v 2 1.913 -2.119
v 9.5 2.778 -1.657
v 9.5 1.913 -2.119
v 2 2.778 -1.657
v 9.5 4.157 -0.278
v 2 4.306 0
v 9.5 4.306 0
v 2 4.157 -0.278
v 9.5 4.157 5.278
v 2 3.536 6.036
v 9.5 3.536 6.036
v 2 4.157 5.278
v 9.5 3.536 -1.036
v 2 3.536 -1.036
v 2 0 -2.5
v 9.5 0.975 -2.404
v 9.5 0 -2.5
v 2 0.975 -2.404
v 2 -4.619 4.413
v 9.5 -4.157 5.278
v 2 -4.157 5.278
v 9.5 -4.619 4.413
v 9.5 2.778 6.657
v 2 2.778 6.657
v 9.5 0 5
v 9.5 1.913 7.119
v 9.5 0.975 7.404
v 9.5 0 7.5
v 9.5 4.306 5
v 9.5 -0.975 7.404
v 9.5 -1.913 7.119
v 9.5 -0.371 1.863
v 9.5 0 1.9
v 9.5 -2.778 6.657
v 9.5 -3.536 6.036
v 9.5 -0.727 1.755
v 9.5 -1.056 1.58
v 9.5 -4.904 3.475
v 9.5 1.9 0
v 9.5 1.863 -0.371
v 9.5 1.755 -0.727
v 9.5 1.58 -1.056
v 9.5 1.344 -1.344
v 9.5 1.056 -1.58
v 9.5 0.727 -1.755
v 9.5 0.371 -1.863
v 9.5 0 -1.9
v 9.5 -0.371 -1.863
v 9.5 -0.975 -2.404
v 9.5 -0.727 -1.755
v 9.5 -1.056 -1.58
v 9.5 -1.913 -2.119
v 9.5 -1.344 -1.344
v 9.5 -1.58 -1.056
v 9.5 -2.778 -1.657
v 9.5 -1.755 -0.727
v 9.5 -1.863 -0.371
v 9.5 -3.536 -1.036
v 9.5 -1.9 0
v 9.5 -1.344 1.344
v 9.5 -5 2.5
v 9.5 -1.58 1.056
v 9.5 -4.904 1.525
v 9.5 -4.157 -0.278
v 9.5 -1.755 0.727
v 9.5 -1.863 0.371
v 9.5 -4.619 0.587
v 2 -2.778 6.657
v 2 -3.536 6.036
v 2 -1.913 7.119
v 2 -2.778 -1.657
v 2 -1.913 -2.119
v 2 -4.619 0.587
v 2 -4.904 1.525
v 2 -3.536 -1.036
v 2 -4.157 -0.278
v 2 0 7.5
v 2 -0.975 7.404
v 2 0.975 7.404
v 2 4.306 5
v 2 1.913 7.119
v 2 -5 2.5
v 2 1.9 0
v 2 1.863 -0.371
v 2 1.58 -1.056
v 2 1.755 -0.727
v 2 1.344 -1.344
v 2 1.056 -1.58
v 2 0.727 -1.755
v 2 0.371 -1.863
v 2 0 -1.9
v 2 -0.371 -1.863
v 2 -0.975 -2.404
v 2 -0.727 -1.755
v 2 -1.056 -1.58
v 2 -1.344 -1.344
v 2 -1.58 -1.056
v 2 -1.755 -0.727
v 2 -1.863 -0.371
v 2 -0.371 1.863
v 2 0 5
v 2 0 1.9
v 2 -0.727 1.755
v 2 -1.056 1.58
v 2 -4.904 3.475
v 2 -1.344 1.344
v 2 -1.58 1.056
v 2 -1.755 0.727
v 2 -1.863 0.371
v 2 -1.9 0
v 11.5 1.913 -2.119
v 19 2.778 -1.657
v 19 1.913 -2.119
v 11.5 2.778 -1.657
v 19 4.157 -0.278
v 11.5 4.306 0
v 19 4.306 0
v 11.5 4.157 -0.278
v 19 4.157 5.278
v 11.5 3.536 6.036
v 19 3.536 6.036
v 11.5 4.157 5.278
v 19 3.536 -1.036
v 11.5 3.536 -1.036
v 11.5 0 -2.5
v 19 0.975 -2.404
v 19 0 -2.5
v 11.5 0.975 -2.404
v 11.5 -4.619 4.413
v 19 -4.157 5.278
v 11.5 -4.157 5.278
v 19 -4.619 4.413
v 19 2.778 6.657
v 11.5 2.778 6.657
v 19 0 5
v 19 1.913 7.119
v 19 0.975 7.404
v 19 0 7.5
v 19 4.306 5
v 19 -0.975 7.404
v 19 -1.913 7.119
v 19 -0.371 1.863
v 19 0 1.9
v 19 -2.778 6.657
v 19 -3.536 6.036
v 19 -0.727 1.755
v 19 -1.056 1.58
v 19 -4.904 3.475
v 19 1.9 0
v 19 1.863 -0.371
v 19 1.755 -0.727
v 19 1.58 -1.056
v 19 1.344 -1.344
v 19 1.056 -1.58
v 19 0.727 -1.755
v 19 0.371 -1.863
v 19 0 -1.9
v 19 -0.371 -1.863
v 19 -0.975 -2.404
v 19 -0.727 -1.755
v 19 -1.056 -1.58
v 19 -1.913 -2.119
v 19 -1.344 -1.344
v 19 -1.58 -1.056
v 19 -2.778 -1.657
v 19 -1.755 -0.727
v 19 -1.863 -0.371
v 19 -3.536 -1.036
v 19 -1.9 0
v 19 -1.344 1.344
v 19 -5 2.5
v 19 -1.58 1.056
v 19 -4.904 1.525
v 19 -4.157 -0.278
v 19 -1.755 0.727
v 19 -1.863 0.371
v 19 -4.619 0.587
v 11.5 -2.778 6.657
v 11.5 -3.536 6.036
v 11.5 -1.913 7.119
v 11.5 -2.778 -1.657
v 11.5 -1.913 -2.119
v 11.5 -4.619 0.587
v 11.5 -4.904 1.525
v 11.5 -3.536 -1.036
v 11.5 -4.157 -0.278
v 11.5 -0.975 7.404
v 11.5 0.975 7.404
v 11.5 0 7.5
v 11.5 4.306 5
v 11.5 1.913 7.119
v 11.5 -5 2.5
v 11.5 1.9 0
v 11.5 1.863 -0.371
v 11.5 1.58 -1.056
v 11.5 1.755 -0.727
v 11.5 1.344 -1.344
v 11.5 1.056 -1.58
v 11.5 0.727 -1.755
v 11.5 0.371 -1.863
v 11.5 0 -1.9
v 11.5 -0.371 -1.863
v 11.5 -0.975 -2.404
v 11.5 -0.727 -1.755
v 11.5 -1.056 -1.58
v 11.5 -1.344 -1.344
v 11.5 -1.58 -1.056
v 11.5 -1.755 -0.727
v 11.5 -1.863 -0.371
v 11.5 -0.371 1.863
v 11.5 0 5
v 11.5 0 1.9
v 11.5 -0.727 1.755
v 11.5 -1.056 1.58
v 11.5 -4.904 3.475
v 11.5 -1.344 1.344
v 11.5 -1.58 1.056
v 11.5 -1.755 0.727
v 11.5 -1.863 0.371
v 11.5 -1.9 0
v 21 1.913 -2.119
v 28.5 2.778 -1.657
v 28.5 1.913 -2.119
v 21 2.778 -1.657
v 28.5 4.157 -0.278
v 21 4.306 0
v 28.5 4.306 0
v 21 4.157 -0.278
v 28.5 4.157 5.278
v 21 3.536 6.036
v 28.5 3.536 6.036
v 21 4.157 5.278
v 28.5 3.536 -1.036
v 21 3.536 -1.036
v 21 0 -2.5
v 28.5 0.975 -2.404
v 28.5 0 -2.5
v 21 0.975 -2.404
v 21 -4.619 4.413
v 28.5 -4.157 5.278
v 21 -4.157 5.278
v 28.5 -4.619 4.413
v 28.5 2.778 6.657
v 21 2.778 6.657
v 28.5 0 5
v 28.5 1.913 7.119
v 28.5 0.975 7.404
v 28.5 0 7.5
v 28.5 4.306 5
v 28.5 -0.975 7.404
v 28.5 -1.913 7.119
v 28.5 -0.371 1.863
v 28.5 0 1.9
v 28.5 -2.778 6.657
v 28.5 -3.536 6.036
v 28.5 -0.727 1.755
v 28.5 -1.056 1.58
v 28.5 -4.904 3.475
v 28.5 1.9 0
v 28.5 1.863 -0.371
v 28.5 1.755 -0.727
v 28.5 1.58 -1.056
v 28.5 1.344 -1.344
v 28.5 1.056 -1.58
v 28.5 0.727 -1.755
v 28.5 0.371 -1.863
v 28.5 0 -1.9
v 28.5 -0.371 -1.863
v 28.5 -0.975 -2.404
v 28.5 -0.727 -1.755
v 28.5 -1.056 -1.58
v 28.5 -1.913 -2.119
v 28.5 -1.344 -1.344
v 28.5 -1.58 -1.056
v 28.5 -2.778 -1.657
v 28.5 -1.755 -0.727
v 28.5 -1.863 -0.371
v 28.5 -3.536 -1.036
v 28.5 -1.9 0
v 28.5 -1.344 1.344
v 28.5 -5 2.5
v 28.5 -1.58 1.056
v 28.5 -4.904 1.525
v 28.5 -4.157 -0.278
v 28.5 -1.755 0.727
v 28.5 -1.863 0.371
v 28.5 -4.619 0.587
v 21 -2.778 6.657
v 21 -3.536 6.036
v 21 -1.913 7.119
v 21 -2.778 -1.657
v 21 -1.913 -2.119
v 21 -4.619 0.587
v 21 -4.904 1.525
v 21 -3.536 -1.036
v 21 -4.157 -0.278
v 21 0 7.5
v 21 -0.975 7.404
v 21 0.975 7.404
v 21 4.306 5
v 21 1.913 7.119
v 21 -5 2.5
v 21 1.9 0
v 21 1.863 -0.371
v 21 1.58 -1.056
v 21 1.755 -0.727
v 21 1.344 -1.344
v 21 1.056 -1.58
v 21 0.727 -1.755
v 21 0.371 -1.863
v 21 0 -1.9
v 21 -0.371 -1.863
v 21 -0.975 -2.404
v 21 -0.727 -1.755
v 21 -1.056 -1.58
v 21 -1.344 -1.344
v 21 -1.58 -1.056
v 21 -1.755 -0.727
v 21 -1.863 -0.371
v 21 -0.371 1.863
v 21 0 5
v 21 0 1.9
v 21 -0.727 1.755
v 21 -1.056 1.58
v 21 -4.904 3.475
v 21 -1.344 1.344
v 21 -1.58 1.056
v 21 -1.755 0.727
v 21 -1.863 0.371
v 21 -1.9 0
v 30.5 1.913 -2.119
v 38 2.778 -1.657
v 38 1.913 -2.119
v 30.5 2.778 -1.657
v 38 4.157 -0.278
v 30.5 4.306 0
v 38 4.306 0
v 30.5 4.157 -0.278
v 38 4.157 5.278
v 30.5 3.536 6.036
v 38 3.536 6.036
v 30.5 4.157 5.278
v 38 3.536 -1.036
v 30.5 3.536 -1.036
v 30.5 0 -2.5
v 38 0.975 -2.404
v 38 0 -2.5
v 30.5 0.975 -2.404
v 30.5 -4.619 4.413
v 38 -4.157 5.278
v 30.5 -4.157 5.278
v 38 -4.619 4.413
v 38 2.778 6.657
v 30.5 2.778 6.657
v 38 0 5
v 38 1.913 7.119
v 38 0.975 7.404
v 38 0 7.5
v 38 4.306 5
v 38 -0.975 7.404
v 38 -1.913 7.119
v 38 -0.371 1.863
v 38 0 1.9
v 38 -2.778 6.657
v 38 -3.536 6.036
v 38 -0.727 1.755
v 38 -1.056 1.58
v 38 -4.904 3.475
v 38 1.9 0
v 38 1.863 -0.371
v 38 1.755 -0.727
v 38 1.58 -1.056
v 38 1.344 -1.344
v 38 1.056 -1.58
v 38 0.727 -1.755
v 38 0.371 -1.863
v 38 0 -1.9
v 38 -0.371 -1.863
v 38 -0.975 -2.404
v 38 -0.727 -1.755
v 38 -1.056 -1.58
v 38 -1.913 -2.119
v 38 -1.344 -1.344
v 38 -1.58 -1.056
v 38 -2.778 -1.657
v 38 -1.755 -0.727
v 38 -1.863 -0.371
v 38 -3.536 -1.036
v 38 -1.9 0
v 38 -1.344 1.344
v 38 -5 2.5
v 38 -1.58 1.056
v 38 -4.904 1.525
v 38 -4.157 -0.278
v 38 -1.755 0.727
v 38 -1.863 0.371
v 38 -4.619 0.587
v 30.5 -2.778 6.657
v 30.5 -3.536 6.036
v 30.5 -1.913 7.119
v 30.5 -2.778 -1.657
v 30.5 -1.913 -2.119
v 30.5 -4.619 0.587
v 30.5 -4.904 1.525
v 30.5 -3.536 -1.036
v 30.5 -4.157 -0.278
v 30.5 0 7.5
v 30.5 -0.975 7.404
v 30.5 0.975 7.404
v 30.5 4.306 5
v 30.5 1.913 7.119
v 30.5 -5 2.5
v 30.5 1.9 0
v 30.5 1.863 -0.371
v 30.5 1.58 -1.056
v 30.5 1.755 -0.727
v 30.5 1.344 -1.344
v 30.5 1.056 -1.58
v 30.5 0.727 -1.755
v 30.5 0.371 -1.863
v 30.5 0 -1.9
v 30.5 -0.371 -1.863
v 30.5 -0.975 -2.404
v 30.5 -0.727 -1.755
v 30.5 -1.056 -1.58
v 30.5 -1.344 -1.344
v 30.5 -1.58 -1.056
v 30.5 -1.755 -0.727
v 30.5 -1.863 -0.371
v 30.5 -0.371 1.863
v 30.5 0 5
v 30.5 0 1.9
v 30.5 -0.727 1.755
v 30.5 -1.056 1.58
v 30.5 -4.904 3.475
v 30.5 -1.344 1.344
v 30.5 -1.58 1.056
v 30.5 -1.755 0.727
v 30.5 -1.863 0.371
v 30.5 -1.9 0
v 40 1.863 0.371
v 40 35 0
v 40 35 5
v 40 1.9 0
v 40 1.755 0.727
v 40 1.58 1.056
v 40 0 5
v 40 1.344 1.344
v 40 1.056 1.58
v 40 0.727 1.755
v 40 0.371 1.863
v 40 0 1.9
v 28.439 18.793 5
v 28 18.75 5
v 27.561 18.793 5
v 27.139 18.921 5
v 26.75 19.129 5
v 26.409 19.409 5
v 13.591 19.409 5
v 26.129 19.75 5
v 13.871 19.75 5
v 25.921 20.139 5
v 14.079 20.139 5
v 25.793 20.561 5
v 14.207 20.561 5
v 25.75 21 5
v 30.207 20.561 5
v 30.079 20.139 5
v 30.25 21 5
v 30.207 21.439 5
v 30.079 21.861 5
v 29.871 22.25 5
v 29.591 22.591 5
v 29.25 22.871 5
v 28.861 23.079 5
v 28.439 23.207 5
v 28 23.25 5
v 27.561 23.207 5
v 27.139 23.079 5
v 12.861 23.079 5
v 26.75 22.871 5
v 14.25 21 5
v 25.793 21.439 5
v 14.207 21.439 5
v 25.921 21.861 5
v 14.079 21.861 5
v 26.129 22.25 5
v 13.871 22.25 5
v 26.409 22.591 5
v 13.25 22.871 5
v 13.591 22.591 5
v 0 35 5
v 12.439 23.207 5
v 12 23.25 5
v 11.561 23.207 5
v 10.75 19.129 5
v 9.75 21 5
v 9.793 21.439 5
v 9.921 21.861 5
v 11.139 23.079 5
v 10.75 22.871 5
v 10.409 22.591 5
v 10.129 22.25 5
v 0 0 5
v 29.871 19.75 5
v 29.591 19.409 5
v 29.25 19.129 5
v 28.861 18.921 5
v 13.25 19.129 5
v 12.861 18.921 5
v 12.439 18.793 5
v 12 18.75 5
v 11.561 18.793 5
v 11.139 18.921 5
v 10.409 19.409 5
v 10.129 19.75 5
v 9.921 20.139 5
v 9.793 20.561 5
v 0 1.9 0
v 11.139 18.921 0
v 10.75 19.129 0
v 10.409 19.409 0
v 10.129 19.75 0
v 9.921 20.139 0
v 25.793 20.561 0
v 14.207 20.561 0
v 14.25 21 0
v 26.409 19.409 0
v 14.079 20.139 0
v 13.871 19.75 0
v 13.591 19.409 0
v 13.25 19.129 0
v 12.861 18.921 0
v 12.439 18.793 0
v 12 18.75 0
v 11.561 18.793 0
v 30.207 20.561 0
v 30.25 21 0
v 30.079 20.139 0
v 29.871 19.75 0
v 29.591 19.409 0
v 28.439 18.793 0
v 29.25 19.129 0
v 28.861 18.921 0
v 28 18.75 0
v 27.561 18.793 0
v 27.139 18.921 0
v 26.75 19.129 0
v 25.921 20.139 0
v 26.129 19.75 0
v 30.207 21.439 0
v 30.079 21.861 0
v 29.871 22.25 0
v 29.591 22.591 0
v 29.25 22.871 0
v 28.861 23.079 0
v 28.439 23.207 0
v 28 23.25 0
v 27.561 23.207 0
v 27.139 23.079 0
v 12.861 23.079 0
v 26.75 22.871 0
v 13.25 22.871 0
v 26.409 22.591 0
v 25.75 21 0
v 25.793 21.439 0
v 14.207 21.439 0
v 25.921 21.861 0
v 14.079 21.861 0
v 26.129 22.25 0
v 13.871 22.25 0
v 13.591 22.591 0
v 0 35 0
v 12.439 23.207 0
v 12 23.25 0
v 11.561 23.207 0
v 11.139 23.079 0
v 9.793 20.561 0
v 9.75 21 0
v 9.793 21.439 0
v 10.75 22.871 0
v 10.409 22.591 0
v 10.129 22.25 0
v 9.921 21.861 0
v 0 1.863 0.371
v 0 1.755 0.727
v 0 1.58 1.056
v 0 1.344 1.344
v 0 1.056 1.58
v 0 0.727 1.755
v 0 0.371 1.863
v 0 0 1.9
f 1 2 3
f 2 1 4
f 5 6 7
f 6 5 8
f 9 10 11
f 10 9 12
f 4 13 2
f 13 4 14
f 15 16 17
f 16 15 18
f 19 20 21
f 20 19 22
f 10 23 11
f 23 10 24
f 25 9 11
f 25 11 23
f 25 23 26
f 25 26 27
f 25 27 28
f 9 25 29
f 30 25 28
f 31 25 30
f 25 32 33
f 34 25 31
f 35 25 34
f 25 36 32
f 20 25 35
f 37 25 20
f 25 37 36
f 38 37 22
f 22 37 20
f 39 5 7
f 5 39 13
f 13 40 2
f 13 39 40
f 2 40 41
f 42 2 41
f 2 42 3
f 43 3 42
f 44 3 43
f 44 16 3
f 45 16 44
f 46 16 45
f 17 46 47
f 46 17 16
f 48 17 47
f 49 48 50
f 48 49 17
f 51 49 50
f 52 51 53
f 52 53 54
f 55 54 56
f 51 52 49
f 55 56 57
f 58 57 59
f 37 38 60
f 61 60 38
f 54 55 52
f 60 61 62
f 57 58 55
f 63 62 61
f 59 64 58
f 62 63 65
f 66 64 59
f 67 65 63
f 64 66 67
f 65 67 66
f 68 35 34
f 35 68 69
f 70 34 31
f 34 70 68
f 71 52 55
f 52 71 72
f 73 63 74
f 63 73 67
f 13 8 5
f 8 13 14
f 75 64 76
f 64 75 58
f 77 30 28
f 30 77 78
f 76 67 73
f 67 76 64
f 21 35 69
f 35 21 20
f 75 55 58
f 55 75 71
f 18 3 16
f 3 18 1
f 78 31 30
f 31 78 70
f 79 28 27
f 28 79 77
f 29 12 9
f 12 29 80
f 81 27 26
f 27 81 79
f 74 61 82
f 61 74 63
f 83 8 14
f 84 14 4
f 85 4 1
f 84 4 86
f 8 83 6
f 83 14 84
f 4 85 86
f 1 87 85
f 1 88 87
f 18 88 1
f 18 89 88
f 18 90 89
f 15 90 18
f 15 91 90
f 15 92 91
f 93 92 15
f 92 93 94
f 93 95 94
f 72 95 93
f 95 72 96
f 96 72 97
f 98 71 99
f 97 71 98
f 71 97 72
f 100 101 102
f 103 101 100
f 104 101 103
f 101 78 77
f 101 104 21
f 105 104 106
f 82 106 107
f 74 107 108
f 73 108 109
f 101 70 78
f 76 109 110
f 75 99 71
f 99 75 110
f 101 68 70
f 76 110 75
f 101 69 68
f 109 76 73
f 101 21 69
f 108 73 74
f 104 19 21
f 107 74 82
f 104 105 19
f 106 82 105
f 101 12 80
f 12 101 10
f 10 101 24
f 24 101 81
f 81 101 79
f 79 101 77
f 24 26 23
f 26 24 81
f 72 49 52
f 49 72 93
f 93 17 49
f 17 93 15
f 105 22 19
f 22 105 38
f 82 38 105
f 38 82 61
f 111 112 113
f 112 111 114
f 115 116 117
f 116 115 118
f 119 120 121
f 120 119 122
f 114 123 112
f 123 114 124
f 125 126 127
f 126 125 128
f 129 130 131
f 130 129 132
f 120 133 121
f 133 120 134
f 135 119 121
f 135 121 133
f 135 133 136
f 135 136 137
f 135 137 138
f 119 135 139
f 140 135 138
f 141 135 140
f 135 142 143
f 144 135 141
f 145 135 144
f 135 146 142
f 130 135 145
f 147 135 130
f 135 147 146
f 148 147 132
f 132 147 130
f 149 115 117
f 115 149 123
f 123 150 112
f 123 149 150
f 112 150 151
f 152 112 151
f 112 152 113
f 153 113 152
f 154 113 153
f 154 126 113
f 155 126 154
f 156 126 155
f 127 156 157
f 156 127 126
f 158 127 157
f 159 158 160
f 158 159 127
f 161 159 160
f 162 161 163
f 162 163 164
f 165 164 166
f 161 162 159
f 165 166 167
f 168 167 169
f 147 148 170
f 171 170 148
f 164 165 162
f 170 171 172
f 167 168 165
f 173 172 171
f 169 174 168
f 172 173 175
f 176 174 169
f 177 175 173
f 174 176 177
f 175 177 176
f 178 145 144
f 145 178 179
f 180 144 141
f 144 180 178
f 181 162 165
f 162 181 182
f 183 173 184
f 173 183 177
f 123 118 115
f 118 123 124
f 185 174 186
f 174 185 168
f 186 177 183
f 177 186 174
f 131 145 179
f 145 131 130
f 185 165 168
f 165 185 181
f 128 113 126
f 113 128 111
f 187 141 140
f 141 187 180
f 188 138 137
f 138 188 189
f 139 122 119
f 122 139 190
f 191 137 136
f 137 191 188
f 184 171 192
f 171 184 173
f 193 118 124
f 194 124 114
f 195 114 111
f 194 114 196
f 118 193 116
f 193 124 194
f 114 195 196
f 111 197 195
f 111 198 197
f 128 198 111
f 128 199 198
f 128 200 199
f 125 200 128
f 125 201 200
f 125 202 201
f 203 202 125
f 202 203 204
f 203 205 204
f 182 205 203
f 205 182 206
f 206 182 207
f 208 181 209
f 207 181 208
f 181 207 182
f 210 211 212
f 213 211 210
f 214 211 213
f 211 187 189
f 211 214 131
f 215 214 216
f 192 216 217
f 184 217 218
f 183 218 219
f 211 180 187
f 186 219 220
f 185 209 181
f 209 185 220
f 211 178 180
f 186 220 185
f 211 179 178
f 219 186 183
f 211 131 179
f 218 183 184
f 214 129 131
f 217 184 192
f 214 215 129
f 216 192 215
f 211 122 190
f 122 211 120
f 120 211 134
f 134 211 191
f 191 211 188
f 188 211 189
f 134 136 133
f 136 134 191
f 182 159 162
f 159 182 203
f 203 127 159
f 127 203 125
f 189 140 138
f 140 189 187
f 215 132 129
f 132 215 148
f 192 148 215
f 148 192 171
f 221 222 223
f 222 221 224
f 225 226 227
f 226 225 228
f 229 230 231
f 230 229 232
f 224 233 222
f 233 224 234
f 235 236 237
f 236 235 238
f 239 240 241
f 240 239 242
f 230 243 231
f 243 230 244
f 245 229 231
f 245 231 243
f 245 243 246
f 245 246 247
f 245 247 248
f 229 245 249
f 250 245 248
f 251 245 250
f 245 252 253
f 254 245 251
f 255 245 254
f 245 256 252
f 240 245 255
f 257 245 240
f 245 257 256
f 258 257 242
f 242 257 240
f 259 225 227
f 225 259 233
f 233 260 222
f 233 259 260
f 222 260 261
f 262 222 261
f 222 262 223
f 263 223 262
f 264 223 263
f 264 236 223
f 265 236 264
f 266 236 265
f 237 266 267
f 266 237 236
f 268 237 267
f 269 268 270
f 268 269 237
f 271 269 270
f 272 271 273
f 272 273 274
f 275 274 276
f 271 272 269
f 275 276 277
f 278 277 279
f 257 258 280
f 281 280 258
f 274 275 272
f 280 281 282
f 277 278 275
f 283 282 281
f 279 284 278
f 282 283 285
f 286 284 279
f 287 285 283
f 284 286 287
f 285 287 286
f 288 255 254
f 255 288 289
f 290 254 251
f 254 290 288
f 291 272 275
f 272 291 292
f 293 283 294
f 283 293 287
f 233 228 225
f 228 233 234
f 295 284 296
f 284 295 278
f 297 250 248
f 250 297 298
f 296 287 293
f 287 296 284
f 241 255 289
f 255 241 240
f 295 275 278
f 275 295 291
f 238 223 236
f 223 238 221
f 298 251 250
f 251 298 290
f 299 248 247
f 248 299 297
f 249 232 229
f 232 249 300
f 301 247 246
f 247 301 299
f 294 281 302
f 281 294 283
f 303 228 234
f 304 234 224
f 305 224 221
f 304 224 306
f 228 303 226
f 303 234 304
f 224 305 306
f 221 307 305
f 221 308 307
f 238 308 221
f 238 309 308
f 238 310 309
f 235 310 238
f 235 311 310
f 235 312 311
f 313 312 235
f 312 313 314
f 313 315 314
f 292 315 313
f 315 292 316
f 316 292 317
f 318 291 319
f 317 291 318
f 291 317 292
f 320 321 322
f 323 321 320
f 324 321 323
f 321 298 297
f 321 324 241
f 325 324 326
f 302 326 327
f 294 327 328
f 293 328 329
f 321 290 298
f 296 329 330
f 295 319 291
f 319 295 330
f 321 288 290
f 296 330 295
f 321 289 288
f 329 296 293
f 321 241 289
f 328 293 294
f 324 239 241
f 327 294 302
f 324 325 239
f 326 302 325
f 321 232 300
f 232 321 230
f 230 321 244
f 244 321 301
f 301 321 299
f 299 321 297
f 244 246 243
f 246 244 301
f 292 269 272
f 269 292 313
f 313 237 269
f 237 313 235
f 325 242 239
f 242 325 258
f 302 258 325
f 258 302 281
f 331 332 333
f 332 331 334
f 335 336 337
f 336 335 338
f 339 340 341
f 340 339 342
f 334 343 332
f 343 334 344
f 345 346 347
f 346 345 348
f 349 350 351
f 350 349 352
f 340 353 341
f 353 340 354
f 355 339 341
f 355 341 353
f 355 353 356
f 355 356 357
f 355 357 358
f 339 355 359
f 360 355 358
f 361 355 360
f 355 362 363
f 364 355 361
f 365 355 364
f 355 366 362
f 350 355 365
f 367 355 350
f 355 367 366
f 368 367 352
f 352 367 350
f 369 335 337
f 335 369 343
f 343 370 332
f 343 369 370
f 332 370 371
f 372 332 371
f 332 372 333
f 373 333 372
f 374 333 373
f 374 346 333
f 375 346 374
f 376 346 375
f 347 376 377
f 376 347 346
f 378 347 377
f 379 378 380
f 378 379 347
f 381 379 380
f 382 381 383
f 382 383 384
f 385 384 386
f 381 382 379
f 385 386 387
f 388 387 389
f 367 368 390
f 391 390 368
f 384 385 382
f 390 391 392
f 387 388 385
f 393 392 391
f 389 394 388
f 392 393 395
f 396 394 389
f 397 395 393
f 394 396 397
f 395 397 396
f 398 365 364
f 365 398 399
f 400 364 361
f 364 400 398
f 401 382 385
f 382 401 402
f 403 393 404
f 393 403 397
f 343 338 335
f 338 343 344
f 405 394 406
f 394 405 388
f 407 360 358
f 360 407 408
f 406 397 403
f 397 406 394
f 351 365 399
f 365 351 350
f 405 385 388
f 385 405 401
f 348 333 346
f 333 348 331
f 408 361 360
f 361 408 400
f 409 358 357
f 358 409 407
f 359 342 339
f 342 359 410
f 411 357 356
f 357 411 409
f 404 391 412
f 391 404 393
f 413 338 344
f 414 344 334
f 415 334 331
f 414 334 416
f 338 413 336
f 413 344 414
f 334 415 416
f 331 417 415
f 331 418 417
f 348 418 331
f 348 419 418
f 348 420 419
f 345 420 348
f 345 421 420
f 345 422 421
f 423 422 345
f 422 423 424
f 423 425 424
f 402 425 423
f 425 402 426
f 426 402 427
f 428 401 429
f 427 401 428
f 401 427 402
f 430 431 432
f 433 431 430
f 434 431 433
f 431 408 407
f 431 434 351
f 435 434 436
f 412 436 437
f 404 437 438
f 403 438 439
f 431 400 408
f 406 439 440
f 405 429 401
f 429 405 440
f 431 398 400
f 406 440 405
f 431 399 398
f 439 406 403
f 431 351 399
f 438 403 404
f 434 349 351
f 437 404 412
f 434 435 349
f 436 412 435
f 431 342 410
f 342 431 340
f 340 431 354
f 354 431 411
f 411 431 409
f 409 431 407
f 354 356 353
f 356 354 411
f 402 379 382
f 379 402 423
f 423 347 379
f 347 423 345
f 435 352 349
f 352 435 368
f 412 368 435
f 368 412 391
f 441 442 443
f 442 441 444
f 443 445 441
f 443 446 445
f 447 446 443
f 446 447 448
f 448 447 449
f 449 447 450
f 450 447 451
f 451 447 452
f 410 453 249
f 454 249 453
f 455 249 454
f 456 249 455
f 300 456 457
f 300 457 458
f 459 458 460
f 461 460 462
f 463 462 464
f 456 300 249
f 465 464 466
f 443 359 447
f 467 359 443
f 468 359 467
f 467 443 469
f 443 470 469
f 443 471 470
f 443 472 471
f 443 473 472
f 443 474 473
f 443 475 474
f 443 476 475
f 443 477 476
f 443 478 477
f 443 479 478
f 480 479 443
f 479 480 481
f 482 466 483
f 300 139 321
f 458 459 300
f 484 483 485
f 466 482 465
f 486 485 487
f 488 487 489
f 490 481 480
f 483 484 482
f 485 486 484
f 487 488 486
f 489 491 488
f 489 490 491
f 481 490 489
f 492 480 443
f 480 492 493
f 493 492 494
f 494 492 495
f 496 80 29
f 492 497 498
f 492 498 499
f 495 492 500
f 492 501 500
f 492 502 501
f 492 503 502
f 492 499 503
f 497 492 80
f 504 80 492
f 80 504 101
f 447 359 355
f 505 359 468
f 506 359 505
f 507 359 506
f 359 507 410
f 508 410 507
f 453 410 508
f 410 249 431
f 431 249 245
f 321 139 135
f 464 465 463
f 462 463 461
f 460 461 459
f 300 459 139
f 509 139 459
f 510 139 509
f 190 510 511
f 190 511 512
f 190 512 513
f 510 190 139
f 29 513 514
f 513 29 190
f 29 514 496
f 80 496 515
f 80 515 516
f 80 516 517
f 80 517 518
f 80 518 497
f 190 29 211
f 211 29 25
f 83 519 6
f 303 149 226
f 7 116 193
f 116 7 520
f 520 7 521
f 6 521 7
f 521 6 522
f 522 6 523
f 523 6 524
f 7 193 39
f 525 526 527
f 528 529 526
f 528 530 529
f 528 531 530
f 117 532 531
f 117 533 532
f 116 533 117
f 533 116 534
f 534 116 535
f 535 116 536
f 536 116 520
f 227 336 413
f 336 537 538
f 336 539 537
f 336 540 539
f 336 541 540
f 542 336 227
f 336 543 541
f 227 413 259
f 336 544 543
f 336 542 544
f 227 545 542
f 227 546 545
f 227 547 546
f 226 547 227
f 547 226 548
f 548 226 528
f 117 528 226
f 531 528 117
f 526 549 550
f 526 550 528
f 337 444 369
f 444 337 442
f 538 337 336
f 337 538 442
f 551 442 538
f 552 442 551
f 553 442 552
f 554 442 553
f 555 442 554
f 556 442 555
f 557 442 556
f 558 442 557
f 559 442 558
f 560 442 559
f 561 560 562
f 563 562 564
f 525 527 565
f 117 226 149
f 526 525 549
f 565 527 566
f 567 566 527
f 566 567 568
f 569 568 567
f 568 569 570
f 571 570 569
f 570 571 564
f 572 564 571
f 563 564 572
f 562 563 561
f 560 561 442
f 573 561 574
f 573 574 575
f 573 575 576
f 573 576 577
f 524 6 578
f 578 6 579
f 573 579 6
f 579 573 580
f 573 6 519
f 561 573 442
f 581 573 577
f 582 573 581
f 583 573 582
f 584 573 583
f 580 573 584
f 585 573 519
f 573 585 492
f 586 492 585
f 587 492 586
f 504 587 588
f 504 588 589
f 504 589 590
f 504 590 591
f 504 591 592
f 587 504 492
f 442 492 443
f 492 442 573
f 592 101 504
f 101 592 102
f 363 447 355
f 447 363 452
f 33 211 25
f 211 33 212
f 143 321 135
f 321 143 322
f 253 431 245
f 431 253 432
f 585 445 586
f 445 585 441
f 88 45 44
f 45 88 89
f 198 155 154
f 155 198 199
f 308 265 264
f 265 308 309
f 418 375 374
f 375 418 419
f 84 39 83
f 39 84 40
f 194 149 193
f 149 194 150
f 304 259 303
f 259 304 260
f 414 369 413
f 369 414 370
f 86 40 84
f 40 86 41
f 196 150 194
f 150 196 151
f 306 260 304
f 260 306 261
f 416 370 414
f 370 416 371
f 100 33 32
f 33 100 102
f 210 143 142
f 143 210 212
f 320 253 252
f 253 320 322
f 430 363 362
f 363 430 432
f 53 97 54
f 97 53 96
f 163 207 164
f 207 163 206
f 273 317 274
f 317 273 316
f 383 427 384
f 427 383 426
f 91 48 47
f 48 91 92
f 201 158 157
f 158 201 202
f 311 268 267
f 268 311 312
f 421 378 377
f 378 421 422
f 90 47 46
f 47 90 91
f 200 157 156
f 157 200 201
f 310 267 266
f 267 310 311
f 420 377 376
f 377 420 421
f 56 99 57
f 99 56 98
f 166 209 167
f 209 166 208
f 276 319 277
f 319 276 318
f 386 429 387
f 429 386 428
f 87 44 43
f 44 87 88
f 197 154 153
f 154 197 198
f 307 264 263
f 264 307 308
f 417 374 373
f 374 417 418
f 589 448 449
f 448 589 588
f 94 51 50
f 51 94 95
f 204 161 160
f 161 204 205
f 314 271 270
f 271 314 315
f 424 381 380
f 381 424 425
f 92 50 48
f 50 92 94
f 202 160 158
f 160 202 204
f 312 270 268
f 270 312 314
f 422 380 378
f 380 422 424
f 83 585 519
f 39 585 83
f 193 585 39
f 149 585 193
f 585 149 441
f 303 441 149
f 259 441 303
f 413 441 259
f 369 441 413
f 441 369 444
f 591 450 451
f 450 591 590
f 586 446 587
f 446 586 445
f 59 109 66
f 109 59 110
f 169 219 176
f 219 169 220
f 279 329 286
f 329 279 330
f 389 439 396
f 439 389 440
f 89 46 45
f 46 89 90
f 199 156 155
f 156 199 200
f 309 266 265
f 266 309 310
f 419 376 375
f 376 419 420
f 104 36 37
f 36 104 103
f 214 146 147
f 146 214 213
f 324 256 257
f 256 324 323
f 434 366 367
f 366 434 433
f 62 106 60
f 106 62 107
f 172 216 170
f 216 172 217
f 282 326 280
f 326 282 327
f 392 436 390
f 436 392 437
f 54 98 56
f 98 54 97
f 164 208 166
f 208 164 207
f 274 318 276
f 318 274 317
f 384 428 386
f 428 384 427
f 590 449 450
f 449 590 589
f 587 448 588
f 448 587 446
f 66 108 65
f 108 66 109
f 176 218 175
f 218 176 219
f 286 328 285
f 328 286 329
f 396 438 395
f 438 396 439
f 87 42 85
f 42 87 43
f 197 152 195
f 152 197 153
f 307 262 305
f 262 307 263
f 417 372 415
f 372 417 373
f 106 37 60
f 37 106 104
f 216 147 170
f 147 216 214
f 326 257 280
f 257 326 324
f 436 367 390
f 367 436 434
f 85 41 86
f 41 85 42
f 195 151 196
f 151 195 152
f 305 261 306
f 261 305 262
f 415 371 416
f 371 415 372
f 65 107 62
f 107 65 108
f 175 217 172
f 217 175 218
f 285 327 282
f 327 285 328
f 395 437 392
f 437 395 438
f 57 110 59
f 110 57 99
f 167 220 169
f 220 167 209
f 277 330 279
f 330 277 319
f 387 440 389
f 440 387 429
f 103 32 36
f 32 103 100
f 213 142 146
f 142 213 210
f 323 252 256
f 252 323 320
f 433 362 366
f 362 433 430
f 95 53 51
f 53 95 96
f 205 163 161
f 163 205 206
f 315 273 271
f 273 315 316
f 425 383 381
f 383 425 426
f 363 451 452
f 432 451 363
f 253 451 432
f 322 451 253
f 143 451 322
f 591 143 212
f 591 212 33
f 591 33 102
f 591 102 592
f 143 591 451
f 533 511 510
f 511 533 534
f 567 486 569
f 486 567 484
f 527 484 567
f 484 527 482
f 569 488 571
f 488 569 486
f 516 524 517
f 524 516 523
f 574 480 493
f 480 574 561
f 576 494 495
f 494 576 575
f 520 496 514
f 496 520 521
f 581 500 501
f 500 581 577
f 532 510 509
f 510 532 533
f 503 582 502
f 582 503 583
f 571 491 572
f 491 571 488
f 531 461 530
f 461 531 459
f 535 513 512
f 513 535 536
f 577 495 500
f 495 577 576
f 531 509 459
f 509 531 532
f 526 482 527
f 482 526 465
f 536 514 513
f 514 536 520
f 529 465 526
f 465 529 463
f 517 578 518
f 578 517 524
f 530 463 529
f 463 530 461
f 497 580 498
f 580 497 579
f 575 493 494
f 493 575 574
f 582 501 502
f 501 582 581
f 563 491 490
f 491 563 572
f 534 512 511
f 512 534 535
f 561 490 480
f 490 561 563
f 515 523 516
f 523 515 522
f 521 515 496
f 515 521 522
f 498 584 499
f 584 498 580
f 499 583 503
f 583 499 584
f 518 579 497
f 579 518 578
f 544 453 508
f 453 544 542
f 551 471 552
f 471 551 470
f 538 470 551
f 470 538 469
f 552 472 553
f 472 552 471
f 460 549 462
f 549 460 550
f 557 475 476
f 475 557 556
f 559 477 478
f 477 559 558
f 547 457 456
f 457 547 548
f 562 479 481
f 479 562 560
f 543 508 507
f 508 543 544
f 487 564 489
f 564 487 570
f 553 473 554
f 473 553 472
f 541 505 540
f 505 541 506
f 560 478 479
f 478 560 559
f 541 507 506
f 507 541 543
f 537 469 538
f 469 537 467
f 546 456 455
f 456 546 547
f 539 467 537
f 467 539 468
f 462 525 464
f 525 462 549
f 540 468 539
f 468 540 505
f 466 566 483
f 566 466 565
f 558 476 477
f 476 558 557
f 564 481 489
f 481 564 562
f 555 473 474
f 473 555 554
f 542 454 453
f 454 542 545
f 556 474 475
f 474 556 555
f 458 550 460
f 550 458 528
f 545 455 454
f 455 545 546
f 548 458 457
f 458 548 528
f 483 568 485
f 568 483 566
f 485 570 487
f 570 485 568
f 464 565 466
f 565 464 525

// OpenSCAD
$fn = 32;

// ----------------------------------------------------------------------
// Hinge leaf: 40 x 40 x 10 mm
// ----------------------------------------------------------------------

// --- parameters (mm) ---
tab_len = 40;             // leaf length, X
tab_w = 35;               // leaf width, Y
tab_t = 5;                // leaf thickness
ring_d = 10;              // knuckle diameter
ring_w = 7.5;             // knuckle width
knuckle_n = 4;            // number of knuckles
pin_d = 3.8;              // pin bore
gap = 2;                  // gap between the knuckles
screw_d = 4.5;            // screw clearance

module leaf() {
  cube([tab_len, tab_w, tab_t]);
}

module knuckles() {
  /* barrels sit on the leaf edge, the pin axis at half the leaf thickness */
  for (i = [0 : knuckle_n - 1])
    translate([gap + i * (ring_w + gap), 0, tab_t * 0.5])
      rotate([0, 90, 0]) cylinder(h = ring_w, d = ring_d);
}

difference() {
  union() {
    leaf();
    knuckles();
  }
  rotate([0, 90, 0]) translate([0, 0, -1])
    cylinder(h = tab_len + 2, d = pin_d);
  translate([12, tab_w * 0.6, -1]) cylinder(h = tab_t + 2, d = screw_d);
  translate([28, tab_w * 0.6, -1]) cylinder(h = tab_t + 2, d = screw_d);
}
